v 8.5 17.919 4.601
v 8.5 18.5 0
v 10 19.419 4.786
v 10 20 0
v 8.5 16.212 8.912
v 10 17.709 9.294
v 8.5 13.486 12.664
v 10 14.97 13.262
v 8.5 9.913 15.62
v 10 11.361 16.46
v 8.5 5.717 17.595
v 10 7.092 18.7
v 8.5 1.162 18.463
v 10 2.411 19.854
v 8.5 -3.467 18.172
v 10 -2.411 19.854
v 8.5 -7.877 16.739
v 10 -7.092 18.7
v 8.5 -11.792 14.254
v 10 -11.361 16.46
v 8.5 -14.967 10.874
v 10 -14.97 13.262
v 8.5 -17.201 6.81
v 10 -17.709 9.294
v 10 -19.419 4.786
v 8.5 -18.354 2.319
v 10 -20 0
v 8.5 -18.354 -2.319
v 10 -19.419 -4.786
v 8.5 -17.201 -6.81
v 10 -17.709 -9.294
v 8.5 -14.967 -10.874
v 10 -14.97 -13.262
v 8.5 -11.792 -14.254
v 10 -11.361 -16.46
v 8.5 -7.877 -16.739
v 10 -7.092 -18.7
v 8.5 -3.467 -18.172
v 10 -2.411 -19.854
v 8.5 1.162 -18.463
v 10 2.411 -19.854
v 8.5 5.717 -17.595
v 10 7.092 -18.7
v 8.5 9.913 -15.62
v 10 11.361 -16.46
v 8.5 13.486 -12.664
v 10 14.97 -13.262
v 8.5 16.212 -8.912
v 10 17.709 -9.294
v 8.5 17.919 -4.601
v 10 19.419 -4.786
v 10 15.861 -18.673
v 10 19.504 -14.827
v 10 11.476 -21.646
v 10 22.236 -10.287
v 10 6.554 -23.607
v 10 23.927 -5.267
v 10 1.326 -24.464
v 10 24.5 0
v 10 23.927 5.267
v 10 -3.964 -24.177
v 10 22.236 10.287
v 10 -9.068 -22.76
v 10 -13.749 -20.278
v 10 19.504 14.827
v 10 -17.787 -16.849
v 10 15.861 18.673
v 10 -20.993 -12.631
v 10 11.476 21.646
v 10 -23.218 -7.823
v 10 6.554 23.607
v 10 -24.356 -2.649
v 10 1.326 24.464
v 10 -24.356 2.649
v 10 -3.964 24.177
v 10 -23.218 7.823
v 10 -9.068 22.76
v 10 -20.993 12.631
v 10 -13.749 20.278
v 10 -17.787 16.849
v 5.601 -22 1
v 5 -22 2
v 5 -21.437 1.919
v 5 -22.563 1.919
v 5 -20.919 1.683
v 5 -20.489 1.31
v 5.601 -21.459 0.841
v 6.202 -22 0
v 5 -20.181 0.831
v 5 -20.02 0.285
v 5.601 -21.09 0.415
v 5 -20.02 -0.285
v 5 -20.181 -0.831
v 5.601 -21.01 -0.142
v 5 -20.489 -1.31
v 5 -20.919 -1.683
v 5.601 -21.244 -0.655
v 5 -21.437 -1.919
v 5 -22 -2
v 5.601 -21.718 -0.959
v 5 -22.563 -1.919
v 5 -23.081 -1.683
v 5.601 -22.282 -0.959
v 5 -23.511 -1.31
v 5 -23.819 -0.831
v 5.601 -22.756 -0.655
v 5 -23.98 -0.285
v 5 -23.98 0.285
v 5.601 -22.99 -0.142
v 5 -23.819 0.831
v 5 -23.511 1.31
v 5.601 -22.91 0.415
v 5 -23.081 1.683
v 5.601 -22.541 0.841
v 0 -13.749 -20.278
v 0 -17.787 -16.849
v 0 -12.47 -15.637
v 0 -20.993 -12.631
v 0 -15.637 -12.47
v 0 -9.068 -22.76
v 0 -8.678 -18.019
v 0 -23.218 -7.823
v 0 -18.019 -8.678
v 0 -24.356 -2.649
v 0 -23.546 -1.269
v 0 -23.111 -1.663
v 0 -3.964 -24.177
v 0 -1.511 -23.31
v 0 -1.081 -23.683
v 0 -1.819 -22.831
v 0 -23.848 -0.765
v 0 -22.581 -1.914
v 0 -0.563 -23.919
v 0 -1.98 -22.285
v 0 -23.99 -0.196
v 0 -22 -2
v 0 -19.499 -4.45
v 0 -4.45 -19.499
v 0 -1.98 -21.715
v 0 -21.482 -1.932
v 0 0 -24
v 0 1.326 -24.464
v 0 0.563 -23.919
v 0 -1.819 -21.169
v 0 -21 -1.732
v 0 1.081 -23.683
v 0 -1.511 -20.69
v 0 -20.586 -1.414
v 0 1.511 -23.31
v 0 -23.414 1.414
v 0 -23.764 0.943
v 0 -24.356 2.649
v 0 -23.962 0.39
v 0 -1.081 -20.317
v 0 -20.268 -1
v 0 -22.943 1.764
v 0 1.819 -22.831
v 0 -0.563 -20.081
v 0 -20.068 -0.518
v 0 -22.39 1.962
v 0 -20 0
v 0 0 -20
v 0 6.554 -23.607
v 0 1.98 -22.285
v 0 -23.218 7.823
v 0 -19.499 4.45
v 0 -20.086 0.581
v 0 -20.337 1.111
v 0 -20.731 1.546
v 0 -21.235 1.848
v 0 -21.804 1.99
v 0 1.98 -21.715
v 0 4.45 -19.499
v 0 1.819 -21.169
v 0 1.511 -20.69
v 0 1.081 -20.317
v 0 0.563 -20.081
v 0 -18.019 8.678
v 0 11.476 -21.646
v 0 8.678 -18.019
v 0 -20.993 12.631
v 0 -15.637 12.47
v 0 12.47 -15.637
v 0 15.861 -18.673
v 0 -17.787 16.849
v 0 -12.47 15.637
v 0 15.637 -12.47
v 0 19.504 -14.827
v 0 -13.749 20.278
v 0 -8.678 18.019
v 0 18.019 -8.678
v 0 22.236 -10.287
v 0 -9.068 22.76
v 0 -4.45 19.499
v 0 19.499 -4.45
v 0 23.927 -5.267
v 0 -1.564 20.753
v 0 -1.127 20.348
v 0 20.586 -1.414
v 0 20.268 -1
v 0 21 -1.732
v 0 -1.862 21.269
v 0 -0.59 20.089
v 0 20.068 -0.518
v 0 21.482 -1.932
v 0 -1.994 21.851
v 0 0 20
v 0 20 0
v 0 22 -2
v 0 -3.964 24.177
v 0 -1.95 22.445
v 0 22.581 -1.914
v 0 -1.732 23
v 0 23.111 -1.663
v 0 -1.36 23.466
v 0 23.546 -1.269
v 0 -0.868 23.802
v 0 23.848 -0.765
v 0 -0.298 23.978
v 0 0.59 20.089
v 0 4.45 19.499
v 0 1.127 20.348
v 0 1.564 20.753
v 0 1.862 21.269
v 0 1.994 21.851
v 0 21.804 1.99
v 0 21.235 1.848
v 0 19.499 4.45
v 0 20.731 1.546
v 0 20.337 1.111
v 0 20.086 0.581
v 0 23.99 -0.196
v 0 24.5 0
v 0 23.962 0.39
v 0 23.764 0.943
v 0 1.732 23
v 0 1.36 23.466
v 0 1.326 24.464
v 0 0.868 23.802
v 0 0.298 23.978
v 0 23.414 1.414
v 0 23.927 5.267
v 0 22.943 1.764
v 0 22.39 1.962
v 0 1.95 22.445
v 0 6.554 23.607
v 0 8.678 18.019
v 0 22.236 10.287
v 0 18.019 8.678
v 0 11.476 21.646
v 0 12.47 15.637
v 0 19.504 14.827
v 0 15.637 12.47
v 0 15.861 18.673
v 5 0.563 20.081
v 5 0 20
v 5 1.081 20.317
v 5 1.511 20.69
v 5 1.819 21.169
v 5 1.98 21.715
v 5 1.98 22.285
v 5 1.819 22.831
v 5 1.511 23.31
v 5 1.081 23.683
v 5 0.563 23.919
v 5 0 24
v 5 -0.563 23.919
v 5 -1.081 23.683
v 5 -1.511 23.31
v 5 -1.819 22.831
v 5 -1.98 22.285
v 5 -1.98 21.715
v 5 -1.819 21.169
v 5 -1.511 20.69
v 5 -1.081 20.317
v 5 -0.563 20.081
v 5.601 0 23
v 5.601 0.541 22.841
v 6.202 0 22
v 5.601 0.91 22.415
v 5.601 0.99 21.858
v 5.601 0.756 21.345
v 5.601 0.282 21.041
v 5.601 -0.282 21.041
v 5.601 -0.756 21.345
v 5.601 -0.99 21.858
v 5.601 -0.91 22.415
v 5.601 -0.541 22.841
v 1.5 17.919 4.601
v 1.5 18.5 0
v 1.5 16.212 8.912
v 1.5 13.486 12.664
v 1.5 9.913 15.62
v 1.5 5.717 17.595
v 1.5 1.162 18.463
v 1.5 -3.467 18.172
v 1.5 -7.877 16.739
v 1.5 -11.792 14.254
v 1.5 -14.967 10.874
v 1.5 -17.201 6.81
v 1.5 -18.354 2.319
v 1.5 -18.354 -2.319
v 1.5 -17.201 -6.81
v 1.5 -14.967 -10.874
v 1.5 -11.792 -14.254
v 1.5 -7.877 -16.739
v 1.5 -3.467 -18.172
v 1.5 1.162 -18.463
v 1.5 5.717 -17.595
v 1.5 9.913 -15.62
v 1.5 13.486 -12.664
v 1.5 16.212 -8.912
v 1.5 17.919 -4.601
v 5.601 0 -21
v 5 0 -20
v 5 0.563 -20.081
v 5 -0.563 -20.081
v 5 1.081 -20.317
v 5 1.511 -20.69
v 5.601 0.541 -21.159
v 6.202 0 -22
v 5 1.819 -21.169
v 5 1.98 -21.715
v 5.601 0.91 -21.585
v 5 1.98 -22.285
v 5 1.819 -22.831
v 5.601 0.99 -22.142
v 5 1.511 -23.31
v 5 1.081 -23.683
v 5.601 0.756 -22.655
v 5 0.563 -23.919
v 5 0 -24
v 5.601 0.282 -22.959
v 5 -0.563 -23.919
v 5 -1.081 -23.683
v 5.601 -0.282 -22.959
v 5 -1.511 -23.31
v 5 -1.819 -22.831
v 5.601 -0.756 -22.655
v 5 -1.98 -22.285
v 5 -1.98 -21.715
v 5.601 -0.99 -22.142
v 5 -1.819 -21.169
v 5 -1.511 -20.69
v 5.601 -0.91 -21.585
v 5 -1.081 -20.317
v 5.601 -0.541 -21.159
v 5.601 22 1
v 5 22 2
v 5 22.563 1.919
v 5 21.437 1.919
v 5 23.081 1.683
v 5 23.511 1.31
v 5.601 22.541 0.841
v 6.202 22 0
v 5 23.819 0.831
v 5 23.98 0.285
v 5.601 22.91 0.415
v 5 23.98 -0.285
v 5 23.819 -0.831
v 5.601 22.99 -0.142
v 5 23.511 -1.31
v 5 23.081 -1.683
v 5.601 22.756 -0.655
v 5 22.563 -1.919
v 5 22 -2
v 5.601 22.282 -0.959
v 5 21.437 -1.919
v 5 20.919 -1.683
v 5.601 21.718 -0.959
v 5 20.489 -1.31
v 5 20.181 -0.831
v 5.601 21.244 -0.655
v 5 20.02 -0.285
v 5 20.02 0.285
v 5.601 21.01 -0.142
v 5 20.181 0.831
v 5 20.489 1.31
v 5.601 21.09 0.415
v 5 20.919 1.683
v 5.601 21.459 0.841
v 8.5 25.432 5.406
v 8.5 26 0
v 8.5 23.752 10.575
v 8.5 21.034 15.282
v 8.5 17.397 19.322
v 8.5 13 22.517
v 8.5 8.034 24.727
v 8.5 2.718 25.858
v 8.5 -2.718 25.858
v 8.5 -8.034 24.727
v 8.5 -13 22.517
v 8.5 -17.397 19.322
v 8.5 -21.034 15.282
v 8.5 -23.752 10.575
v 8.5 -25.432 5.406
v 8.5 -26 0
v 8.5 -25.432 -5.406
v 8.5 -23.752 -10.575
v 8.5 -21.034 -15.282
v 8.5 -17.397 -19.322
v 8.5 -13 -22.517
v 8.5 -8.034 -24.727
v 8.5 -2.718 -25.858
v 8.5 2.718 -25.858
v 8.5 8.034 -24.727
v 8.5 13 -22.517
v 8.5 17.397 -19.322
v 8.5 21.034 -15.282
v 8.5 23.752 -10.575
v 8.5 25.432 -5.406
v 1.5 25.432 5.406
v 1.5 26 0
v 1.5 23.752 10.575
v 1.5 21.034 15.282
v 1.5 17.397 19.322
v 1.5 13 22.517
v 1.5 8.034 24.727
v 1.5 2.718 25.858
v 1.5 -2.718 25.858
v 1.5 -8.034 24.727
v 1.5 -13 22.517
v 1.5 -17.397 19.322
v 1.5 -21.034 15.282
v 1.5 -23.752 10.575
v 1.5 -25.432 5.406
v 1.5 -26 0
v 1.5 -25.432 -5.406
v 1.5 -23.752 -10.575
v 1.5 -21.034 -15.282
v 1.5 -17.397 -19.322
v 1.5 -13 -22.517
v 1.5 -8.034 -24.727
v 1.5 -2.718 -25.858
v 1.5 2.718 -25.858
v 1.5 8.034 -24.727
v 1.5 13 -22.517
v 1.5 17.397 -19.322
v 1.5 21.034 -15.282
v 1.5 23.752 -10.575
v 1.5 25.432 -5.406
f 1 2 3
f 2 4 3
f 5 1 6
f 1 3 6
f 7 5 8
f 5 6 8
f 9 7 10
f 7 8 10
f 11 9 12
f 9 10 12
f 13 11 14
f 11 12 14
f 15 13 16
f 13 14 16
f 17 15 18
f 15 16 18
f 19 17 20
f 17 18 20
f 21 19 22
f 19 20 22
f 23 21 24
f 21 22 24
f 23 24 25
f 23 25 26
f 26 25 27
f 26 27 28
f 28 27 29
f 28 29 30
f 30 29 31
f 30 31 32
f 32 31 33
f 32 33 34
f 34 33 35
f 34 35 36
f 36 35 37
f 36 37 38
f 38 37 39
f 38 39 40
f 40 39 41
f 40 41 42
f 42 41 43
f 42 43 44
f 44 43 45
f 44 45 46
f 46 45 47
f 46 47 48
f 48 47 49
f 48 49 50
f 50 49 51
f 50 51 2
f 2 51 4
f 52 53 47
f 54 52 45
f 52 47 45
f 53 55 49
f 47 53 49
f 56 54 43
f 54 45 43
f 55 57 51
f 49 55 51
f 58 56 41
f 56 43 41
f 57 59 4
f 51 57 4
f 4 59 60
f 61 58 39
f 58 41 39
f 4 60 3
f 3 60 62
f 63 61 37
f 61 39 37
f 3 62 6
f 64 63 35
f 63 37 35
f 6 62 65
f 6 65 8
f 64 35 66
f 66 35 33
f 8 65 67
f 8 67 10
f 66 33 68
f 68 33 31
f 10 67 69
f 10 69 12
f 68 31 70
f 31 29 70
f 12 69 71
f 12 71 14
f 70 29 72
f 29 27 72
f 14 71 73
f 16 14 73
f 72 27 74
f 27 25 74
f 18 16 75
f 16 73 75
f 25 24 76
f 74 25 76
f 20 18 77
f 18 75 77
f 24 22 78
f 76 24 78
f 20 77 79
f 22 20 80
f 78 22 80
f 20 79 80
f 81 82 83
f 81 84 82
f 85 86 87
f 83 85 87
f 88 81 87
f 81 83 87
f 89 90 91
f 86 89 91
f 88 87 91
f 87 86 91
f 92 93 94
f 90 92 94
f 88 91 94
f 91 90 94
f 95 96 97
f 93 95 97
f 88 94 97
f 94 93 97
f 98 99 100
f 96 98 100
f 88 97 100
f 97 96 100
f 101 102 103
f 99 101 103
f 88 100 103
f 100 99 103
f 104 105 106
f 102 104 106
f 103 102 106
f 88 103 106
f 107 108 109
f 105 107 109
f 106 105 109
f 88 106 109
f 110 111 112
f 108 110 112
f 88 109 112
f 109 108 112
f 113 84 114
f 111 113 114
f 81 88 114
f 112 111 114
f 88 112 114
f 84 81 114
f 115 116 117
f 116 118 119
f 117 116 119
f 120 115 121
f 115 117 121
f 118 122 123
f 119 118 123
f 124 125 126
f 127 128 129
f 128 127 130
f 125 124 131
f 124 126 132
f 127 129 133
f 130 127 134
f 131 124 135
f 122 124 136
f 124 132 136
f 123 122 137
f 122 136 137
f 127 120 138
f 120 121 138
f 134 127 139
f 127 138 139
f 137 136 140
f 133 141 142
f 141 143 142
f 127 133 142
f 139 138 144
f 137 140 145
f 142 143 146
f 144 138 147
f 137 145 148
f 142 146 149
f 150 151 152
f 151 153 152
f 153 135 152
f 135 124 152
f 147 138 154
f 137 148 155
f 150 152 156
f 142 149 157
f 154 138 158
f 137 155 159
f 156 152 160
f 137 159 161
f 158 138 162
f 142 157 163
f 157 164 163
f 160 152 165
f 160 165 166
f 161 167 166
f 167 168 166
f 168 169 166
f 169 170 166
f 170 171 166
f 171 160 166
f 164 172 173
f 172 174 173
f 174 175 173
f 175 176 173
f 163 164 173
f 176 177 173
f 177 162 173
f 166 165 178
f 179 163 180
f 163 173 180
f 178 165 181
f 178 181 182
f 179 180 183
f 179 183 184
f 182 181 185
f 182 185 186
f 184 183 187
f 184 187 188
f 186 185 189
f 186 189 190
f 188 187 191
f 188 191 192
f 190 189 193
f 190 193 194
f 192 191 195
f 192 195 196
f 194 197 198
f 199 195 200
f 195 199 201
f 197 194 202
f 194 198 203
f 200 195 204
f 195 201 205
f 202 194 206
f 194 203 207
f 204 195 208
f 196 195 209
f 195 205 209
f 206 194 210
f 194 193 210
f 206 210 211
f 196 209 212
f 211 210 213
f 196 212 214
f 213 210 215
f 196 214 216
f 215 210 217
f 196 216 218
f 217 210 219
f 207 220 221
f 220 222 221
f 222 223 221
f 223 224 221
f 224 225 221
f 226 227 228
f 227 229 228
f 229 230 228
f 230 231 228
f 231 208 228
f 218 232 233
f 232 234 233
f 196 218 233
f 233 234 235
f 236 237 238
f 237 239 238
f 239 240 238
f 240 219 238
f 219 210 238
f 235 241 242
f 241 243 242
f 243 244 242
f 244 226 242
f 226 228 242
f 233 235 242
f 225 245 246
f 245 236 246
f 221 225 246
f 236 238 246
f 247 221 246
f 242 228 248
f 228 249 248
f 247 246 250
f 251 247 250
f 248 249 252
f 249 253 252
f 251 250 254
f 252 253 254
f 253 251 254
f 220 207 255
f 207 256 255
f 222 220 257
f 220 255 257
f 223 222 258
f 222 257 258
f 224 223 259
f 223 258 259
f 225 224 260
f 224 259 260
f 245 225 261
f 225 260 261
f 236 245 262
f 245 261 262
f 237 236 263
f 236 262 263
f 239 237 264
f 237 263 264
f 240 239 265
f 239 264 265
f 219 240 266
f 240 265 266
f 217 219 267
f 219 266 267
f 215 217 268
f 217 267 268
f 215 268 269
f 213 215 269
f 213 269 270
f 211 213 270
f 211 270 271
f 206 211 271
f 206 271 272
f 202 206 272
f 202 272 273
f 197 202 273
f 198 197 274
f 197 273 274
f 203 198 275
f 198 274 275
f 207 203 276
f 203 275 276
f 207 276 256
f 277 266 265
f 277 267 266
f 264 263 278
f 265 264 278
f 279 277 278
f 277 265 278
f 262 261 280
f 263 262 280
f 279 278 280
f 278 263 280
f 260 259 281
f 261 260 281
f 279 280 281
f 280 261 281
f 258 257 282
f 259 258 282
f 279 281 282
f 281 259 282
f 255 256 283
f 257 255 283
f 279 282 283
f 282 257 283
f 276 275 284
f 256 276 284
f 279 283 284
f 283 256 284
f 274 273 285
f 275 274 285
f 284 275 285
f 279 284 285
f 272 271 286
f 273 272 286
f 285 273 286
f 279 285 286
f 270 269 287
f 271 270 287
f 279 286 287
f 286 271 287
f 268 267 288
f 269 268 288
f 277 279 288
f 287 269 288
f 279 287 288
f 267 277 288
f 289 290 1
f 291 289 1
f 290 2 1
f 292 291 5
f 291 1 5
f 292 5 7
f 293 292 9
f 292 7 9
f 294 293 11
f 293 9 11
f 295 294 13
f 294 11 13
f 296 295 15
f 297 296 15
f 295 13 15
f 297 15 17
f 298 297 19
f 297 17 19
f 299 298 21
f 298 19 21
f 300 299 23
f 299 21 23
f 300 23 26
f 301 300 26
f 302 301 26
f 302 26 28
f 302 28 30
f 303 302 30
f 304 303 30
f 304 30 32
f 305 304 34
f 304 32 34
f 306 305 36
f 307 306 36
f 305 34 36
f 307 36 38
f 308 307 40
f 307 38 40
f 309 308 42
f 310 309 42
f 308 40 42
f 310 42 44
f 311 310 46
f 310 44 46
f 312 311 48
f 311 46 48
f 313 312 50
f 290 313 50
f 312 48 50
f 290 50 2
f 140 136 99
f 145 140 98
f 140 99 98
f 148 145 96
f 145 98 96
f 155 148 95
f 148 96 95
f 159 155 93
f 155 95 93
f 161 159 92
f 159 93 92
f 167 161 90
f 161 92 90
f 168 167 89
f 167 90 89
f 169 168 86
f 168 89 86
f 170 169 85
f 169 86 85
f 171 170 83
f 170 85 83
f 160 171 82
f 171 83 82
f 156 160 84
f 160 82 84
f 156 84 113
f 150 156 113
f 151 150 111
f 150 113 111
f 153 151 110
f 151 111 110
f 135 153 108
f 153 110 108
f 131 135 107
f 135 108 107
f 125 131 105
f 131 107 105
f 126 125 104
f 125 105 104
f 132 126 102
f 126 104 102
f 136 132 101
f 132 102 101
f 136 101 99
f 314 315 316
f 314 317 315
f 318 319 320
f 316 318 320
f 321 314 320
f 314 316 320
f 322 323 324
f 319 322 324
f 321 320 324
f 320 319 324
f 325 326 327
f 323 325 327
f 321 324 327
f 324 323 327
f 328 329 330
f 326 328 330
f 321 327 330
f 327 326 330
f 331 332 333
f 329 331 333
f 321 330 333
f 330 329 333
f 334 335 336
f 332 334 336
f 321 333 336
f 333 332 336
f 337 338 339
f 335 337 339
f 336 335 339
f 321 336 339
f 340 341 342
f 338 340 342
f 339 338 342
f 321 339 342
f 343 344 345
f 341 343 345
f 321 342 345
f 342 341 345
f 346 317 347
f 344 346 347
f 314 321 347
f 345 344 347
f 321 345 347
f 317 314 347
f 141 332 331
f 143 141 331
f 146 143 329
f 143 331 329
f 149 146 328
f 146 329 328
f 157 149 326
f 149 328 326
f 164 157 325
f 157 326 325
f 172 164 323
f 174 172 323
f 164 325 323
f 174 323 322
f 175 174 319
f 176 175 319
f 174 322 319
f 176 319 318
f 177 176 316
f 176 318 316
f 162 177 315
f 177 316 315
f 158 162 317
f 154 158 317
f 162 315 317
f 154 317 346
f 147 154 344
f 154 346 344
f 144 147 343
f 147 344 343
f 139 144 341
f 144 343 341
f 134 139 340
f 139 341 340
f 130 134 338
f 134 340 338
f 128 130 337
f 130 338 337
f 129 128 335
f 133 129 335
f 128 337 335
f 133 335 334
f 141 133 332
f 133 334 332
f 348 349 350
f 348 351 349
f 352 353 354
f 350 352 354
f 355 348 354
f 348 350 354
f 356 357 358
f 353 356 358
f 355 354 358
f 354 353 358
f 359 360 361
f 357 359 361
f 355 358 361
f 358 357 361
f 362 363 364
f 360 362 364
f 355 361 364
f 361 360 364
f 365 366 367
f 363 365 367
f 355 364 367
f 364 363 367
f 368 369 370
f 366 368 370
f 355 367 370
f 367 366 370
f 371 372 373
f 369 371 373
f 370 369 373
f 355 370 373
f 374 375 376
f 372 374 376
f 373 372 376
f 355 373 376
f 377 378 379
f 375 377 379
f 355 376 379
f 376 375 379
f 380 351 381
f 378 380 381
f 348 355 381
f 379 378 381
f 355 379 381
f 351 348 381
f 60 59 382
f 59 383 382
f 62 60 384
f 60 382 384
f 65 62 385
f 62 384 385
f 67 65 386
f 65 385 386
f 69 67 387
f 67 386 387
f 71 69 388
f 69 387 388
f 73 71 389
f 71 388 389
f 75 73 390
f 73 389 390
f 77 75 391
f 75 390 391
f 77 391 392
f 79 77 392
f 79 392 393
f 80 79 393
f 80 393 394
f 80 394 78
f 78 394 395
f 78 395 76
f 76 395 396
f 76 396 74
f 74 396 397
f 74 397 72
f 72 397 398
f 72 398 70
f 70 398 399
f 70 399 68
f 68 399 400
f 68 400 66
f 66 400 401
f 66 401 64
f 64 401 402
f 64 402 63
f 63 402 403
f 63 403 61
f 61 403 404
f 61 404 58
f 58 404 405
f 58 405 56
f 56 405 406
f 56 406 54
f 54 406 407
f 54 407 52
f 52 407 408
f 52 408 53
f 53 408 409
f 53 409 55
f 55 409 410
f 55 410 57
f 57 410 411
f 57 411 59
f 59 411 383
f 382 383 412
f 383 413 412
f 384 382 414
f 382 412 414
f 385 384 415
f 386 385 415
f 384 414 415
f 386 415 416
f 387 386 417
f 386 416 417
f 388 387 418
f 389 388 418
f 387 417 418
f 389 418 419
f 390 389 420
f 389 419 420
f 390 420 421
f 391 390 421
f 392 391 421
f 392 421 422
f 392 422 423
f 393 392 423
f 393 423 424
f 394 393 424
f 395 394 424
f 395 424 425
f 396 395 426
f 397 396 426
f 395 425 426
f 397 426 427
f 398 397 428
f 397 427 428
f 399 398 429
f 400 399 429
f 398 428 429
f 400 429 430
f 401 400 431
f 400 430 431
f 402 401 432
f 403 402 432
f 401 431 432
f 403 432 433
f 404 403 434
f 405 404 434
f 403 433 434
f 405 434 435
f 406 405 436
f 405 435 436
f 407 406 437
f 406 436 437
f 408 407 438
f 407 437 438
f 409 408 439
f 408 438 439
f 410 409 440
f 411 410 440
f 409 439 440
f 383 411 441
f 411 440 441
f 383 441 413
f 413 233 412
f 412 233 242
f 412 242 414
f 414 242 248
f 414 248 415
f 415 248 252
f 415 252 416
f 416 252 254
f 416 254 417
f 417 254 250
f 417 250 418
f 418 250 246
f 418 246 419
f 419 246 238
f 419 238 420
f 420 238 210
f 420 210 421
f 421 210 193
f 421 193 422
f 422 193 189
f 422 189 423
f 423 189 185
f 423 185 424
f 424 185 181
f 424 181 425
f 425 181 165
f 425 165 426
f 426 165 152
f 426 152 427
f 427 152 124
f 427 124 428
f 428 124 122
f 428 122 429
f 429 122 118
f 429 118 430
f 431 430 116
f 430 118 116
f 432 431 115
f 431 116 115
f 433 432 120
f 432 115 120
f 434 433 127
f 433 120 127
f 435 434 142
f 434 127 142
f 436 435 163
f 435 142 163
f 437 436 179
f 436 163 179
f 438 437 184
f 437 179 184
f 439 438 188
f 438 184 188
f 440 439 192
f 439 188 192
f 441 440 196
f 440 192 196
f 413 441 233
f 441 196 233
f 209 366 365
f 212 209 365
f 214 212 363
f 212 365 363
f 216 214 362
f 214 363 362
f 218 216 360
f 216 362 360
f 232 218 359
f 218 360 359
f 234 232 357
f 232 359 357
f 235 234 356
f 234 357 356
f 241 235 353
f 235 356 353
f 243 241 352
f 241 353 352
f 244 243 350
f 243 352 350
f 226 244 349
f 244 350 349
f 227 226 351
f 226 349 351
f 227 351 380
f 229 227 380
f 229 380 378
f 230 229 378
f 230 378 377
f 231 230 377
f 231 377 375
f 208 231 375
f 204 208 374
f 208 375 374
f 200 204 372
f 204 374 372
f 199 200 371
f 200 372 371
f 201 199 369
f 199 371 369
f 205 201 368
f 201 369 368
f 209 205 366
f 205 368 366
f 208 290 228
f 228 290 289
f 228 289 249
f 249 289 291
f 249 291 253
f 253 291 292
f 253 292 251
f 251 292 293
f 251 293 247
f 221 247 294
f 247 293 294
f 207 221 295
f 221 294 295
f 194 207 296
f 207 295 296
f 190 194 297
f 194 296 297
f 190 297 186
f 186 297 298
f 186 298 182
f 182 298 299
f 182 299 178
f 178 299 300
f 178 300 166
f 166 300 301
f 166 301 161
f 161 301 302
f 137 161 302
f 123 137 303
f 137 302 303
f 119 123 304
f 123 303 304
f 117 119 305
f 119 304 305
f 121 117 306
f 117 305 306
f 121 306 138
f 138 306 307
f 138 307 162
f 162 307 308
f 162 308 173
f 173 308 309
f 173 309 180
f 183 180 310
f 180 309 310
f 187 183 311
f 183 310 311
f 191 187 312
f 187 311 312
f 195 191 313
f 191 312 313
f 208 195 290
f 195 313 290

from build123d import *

# Parameters (mm, degrees)
HOLE_WIZARD_4_0_2_D     = 4
HOLE_WIZARD_4_0_2_DEPTH = 5
HOLE_WIZARD_4_0_2_TIP   = 1.201721238


with BuildPart() as part:
    # Эскиз1 → Повернуть1 (revolve)
    with BuildSketch(Plane.XY):
        Polygon((1.5, 18.5), (8.5, 18.5), (10, 20), (10, 24.5), (8.5, 26), (1.5, 26), (0, 24.5), (0, 20), align=None)
    revolve(axis=Axis((0, 0, 0), (1, 0, 0)))

    # Отверстия под штифты Ø4.0 мм2
    with Locations(Plane.ZY):
        with Locations((-22, 0), (0, 22), (22, 0), (0, -22)):
            Hole(HOLE_WIZARD_4_0_2_D / 2, depth=HOLE_WIZARD_4_0_2_DEPTH)
            with Locations((0, 0, -(HOLE_WIZARD_4_0_2_DEPTH + HOLE_WIZARD_4_0_2_TIP / 2))):  # 118° drill point
                Cone(0, HOLE_WIZARD_4_0_2_D / 2, HOLE_WIZARD_4_0_2_TIP, mode=Mode.SUBTRACT)


solid = part.part
